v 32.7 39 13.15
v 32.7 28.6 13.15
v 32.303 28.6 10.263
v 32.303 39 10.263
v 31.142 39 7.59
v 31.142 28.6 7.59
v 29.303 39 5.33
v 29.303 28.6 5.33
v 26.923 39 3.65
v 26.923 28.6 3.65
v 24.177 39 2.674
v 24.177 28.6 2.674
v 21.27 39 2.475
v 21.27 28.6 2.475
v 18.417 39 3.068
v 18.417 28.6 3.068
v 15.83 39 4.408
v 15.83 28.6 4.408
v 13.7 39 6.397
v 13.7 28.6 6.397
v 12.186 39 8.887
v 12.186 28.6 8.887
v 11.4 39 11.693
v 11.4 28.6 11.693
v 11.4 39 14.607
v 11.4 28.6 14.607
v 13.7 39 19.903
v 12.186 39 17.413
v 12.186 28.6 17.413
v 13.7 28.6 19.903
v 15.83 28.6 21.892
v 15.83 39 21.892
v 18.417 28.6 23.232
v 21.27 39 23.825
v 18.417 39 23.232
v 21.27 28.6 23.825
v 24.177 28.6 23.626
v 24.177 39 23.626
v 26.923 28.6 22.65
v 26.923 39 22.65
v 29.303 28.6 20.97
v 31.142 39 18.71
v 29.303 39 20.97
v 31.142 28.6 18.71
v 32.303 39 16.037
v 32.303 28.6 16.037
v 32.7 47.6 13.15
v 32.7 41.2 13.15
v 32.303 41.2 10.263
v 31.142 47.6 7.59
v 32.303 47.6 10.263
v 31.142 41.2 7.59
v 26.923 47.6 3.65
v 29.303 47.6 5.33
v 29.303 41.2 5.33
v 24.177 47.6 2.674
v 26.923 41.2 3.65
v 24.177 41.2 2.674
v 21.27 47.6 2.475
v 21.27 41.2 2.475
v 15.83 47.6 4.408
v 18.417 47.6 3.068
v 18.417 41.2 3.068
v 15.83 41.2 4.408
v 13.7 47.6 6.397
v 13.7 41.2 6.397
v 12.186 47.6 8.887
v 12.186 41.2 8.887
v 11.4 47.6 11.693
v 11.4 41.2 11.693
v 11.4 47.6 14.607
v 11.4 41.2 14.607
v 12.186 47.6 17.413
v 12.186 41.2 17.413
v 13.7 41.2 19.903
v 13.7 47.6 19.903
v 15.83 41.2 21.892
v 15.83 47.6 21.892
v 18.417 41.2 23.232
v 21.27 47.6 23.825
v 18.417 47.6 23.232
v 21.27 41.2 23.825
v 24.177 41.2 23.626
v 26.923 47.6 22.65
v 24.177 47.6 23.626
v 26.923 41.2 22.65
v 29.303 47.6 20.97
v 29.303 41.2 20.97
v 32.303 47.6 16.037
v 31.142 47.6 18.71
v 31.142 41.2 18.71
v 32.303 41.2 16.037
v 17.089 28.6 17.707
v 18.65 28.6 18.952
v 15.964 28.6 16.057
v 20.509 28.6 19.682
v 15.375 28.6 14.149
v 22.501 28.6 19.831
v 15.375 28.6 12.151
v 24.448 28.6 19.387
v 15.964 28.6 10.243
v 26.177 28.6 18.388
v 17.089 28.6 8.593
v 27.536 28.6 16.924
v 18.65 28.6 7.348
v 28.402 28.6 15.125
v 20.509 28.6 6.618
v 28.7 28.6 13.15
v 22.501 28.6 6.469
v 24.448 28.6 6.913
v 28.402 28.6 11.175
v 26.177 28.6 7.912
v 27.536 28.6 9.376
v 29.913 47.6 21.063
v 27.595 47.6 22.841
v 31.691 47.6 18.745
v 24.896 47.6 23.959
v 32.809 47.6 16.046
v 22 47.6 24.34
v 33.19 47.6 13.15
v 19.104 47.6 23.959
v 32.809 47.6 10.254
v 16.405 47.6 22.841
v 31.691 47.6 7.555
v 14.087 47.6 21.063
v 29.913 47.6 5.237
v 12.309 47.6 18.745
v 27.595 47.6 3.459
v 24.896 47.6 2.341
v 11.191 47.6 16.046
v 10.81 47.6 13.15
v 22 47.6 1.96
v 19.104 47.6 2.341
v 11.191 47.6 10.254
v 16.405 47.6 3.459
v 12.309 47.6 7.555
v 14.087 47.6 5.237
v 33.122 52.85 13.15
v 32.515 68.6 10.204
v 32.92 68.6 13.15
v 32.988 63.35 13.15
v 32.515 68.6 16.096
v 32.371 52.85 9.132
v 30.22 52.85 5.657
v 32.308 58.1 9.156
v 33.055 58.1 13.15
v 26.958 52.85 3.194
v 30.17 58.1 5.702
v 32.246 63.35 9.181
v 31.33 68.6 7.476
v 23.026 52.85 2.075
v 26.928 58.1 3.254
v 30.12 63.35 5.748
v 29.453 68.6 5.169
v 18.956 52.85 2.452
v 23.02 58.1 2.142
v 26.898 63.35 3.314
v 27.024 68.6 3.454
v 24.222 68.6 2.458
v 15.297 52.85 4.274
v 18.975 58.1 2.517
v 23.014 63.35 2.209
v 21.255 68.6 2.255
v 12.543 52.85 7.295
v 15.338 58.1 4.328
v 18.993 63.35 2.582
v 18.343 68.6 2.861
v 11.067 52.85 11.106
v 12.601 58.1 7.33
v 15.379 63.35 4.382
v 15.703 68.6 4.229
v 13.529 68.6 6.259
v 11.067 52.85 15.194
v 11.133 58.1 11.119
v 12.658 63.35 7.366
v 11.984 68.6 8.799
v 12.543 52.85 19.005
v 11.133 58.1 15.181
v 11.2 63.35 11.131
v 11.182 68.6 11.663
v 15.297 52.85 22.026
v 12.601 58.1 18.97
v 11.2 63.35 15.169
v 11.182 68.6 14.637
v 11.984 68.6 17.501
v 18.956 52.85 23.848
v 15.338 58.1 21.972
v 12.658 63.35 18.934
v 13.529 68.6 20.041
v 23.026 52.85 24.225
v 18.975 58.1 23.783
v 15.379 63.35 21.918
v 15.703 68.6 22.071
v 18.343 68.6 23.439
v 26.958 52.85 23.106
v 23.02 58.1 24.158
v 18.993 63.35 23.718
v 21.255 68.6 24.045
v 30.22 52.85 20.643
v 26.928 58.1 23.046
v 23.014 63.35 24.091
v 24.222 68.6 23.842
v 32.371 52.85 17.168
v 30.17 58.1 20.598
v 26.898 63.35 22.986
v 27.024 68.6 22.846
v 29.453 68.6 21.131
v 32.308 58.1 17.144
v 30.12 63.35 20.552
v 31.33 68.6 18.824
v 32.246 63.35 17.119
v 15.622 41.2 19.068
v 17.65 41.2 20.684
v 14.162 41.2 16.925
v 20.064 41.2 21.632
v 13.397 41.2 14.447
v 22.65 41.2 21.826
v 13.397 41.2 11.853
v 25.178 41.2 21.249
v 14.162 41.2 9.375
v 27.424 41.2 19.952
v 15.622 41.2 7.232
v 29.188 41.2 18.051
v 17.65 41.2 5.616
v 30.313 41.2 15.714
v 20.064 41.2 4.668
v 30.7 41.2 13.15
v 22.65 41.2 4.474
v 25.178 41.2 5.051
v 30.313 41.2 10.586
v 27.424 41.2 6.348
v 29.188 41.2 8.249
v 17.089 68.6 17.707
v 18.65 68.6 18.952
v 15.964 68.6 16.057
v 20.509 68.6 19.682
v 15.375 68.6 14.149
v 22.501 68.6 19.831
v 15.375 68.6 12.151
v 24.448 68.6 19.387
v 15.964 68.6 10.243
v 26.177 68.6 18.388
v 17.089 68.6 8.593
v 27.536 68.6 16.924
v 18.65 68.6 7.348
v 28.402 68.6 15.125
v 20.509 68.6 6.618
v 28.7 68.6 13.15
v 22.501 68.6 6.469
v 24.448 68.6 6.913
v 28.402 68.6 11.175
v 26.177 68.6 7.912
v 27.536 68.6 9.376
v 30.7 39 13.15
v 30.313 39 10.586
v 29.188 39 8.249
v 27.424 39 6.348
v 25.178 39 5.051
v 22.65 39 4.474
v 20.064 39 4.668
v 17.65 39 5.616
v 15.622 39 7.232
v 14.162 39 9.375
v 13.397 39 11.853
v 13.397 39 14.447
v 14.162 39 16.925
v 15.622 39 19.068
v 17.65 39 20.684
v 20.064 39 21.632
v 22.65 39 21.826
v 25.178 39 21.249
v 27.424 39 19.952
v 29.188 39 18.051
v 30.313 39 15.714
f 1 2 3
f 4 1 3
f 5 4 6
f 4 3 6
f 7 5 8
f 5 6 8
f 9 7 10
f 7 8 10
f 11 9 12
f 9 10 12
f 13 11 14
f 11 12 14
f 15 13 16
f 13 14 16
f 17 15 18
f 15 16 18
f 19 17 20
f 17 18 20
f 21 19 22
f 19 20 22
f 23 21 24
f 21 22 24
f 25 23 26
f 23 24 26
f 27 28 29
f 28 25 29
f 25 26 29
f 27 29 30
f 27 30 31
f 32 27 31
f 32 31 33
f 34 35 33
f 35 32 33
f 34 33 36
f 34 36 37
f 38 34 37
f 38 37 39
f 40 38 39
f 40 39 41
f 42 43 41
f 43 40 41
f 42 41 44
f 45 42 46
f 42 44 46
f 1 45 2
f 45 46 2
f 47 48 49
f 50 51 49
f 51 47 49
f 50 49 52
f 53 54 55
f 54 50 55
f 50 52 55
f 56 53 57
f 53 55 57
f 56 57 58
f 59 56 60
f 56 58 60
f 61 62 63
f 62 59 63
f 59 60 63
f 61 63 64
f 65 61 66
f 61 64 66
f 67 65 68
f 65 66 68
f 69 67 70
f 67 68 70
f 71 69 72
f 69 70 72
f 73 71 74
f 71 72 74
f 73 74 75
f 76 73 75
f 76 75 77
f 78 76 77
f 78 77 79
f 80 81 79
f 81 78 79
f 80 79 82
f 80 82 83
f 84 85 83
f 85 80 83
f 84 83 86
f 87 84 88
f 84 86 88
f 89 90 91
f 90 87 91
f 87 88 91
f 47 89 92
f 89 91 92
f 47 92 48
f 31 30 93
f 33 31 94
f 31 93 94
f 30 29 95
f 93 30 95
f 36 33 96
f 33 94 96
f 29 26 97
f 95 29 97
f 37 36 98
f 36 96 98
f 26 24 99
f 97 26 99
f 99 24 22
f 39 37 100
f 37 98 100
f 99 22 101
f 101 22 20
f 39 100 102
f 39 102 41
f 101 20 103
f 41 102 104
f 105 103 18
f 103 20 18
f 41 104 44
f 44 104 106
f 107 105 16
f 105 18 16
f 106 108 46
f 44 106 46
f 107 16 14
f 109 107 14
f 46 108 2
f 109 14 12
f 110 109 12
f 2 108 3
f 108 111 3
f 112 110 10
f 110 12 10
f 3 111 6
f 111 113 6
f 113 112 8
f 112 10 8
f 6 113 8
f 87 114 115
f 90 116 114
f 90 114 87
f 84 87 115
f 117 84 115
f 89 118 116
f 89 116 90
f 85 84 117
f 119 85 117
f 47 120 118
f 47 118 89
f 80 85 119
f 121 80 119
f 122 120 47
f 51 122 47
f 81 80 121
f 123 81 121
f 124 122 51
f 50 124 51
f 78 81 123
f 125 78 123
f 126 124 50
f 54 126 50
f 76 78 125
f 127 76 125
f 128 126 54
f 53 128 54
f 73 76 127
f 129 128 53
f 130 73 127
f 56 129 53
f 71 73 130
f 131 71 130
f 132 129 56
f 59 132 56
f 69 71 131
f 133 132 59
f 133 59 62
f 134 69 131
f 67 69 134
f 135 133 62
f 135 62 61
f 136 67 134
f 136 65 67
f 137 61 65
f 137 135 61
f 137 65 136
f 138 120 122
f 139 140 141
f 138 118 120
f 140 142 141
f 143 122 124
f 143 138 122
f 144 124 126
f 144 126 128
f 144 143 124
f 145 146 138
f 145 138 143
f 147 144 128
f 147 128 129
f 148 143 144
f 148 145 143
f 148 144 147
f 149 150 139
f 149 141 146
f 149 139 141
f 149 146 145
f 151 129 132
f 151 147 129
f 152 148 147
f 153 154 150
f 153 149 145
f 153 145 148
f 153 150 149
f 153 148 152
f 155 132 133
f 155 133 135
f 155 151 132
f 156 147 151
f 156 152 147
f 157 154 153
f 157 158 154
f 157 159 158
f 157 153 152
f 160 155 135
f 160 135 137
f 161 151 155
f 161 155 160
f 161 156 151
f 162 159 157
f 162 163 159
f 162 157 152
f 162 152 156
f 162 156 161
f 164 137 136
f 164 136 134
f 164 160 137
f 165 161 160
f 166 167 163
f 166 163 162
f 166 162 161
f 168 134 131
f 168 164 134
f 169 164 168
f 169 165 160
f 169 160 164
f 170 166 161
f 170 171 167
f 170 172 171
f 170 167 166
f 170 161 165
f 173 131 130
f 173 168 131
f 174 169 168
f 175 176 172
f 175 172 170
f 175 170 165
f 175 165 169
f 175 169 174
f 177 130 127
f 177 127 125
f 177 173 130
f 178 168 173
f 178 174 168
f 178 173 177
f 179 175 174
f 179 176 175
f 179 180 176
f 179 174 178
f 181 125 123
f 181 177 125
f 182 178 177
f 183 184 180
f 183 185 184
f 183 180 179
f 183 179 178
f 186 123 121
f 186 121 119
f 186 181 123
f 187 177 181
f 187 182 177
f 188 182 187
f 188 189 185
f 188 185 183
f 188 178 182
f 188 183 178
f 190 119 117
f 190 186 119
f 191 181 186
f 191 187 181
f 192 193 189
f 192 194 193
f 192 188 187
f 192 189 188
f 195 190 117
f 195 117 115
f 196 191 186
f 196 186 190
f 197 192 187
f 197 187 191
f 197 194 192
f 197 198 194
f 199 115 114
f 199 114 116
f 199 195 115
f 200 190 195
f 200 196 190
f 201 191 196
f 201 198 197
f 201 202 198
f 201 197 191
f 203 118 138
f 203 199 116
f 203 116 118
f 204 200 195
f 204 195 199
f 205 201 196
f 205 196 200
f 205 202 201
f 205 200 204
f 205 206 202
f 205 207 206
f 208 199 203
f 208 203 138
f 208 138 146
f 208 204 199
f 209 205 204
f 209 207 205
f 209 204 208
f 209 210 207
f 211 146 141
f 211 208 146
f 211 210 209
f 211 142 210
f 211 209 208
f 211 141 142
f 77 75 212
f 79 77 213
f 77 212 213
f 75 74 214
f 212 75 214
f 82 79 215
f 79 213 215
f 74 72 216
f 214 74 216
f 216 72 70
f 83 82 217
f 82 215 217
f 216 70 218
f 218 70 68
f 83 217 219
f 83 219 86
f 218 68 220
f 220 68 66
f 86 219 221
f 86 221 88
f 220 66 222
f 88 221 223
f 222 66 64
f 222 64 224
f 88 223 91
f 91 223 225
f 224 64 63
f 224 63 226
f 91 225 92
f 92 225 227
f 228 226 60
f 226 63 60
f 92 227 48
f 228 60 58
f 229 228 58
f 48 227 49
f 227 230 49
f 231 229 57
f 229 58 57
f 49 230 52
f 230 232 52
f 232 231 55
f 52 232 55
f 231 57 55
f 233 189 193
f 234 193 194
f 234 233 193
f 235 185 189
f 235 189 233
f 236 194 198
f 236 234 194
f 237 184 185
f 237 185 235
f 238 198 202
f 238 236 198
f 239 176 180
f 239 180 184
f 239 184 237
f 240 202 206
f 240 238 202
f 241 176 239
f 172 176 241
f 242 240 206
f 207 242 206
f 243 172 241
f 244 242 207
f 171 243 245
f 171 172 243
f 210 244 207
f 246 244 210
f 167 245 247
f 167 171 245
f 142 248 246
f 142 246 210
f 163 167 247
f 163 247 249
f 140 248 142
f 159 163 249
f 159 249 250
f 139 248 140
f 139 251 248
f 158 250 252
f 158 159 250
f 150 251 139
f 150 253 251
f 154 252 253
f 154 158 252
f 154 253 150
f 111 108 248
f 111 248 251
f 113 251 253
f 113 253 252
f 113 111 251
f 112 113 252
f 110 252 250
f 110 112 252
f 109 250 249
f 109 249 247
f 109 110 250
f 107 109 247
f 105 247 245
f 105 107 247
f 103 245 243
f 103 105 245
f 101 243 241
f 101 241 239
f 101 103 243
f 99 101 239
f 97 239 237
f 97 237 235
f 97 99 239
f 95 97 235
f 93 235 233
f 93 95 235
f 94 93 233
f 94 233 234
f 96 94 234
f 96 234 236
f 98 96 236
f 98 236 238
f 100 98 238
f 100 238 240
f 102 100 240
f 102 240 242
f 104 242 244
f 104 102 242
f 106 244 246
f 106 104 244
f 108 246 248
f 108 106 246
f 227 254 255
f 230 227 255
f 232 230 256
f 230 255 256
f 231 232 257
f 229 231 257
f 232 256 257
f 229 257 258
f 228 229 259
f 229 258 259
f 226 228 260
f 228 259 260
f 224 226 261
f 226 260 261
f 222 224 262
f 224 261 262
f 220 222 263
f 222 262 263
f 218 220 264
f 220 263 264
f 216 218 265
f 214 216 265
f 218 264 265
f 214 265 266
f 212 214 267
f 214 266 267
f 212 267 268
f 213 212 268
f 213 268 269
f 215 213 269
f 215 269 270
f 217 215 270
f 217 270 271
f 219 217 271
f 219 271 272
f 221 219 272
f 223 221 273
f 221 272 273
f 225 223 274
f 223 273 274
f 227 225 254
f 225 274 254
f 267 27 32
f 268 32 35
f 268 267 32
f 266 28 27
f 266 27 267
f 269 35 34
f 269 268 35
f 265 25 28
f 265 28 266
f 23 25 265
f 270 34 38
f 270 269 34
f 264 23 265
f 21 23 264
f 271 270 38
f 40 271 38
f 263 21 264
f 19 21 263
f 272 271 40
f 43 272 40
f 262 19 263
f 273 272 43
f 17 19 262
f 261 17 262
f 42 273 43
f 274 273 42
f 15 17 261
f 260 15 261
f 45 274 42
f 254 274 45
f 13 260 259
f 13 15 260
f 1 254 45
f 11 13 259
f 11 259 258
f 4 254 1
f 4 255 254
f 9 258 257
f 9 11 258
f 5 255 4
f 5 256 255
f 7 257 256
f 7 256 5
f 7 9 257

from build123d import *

# Parameters (mm, degrees)
CYLINDER005_R          = 6.7
CYLINDER005_DEPTH      = 40
CYLINDER061_R          = 8.7
CYLINDER061_DEPTH      = 2.2
CYLINDER062_R          = 10.75
CYLINDER062_DEPTH      = 2.2
CYLINDER019_R          = 10.7
CYLINDER019_DEPTH      = 40
CUT022_PLACEMENT_ANGLE = 90


with BuildPart() as noutlettube:
    # Cylinder005 → Cylinder005 (new body)
    with BuildSketch(Plane.XY):
        Circle(CYLINDER005_R)
    extrude(amount=CYLINDER005_DEPTH)


with BuildPart() as nnotchinner:
    # Cylinder061 → Cylinder061 (new body)
    with BuildSketch(Plane.XY.offset(10.4)):
        Circle(CYLINDER061_R)
    extrude(amount=CYLINDER061_DEPTH)


with BuildPart() as noutletextension:
    # Cylinder062 → Cylinder062 (new body)
    with BuildSketch(Plane.XY.offset(10.4)):
        Circle(CYLINDER062_R)
    extrude(amount=CYLINDER062_DEPTH)

    # Cut: cut nNotchInner
    add(nnotchinner.part, mode=Mode.SUBTRACT)

    # Fusion: union nOutletTube
    add(noutlettube.part)


with BuildPart() as housingoutlet:
    # Cylinder019 → Cylinder019 (new body)
    with BuildSketch(Plane.XY):
        Circle(CYLINDER019_R)
    extrude(amount=CYLINDER019_DEPTH)


with BuildPart() as toplevelpart_outletadapter:
    # Cone001 → Cone001 (revolve)
    with BuildSketch(Plane(origin=(0, 0, 19), x_dir=(1, 0, 0), z_dir=(0, -1, 0))):
        Polygon((0, 0), (11.19, 0), (10.92, 21), (0, 21), align=None)
    revolve(axis=Axis((0, 0, 19), (0, 0, 1)))

    # Fusion054: union HousingOutlet
    add(housingoutlet.part)

    # Cut022: cut nOutletExtension
    add(noutletextension.part, mode=Mode.SUBTRACT)


with BuildPart() as toplevelpart_outletadapter_1:
    # Cut022 placement: moved
    add(toplevelpart_outletadapter.part.moved(Location((22, 28.6, 13.15))).rotate(Axis((22, 28.6, 13.15), (-1, 0, 0)), CUT022_PLACEMENT_ANGLE))


solid = toplevelpart_outletadapter_1.part
